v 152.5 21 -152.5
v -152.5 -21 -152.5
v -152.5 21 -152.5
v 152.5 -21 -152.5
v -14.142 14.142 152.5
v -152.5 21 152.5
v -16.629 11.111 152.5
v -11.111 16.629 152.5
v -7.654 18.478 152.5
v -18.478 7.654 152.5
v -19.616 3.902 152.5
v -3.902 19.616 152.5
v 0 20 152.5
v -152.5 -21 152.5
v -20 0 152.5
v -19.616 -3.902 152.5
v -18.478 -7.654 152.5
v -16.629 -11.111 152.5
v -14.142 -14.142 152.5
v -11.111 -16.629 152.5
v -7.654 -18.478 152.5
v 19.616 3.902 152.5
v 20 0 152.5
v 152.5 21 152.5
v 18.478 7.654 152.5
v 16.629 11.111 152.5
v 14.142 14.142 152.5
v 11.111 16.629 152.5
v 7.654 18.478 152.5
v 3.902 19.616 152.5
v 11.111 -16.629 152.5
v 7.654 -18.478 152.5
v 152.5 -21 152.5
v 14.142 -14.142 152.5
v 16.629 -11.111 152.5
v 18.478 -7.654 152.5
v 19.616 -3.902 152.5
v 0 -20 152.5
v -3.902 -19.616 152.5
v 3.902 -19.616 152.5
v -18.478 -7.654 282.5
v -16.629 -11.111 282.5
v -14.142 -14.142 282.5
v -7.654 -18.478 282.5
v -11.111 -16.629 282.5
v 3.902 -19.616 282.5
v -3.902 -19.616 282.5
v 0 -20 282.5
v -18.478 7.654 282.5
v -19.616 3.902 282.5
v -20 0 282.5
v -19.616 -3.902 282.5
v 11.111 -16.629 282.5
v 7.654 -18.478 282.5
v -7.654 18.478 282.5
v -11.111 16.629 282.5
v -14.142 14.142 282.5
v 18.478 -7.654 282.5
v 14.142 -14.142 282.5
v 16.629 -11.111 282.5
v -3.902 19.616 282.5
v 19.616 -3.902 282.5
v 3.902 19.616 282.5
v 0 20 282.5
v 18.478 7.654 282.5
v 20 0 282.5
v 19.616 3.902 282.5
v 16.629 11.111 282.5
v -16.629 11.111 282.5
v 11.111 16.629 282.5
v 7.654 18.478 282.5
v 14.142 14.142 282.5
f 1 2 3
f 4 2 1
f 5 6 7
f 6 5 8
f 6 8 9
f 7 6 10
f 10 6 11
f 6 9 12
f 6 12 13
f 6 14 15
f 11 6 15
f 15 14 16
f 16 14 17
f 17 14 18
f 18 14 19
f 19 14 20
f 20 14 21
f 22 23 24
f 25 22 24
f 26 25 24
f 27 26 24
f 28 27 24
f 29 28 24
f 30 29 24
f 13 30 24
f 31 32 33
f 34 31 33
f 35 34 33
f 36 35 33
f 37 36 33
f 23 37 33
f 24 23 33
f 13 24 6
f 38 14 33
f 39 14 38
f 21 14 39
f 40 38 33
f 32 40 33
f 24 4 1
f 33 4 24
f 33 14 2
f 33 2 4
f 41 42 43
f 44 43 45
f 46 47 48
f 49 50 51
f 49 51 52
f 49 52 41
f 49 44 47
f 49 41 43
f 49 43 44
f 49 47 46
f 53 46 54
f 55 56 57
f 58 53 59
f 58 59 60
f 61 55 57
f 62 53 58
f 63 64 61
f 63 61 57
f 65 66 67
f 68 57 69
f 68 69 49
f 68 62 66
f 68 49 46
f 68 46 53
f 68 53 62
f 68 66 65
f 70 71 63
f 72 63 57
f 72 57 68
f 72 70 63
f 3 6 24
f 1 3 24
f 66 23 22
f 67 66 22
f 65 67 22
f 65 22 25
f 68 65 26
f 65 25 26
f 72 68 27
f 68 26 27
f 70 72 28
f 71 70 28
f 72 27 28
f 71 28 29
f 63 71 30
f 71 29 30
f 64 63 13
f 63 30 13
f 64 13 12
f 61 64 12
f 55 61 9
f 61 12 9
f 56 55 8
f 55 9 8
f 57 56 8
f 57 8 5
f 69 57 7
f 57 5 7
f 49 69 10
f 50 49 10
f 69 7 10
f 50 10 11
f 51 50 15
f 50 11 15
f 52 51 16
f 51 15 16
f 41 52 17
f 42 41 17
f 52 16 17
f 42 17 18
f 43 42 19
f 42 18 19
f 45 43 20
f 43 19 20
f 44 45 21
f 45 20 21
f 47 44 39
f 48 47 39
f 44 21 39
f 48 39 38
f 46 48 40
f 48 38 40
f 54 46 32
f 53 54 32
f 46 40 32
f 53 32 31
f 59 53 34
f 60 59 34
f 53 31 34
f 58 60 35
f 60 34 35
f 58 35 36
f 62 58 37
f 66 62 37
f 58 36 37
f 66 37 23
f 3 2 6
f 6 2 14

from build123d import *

# Parameters (mm, degrees)
F0_W     = 305
F0_H     = 305
F1_DEPTH = 21
F2_R     = 20
F3_DEPTH = 130


with BuildPart() as f1:
    # F0 (on Front) → F1 (new body, symmetric)
    with BuildSketch(Plane.XZ):
        Rectangle(F0_W, F0_H)
    extrude(amount=F1_DEPTH, both=True)

    # F2 (on face) → F3 (join)
    with BuildSketch(Plane.XY.offset(152.5)):
        Circle(F2_R)
    extrude(amount=F3_DEPTH)


solid = f1.part
